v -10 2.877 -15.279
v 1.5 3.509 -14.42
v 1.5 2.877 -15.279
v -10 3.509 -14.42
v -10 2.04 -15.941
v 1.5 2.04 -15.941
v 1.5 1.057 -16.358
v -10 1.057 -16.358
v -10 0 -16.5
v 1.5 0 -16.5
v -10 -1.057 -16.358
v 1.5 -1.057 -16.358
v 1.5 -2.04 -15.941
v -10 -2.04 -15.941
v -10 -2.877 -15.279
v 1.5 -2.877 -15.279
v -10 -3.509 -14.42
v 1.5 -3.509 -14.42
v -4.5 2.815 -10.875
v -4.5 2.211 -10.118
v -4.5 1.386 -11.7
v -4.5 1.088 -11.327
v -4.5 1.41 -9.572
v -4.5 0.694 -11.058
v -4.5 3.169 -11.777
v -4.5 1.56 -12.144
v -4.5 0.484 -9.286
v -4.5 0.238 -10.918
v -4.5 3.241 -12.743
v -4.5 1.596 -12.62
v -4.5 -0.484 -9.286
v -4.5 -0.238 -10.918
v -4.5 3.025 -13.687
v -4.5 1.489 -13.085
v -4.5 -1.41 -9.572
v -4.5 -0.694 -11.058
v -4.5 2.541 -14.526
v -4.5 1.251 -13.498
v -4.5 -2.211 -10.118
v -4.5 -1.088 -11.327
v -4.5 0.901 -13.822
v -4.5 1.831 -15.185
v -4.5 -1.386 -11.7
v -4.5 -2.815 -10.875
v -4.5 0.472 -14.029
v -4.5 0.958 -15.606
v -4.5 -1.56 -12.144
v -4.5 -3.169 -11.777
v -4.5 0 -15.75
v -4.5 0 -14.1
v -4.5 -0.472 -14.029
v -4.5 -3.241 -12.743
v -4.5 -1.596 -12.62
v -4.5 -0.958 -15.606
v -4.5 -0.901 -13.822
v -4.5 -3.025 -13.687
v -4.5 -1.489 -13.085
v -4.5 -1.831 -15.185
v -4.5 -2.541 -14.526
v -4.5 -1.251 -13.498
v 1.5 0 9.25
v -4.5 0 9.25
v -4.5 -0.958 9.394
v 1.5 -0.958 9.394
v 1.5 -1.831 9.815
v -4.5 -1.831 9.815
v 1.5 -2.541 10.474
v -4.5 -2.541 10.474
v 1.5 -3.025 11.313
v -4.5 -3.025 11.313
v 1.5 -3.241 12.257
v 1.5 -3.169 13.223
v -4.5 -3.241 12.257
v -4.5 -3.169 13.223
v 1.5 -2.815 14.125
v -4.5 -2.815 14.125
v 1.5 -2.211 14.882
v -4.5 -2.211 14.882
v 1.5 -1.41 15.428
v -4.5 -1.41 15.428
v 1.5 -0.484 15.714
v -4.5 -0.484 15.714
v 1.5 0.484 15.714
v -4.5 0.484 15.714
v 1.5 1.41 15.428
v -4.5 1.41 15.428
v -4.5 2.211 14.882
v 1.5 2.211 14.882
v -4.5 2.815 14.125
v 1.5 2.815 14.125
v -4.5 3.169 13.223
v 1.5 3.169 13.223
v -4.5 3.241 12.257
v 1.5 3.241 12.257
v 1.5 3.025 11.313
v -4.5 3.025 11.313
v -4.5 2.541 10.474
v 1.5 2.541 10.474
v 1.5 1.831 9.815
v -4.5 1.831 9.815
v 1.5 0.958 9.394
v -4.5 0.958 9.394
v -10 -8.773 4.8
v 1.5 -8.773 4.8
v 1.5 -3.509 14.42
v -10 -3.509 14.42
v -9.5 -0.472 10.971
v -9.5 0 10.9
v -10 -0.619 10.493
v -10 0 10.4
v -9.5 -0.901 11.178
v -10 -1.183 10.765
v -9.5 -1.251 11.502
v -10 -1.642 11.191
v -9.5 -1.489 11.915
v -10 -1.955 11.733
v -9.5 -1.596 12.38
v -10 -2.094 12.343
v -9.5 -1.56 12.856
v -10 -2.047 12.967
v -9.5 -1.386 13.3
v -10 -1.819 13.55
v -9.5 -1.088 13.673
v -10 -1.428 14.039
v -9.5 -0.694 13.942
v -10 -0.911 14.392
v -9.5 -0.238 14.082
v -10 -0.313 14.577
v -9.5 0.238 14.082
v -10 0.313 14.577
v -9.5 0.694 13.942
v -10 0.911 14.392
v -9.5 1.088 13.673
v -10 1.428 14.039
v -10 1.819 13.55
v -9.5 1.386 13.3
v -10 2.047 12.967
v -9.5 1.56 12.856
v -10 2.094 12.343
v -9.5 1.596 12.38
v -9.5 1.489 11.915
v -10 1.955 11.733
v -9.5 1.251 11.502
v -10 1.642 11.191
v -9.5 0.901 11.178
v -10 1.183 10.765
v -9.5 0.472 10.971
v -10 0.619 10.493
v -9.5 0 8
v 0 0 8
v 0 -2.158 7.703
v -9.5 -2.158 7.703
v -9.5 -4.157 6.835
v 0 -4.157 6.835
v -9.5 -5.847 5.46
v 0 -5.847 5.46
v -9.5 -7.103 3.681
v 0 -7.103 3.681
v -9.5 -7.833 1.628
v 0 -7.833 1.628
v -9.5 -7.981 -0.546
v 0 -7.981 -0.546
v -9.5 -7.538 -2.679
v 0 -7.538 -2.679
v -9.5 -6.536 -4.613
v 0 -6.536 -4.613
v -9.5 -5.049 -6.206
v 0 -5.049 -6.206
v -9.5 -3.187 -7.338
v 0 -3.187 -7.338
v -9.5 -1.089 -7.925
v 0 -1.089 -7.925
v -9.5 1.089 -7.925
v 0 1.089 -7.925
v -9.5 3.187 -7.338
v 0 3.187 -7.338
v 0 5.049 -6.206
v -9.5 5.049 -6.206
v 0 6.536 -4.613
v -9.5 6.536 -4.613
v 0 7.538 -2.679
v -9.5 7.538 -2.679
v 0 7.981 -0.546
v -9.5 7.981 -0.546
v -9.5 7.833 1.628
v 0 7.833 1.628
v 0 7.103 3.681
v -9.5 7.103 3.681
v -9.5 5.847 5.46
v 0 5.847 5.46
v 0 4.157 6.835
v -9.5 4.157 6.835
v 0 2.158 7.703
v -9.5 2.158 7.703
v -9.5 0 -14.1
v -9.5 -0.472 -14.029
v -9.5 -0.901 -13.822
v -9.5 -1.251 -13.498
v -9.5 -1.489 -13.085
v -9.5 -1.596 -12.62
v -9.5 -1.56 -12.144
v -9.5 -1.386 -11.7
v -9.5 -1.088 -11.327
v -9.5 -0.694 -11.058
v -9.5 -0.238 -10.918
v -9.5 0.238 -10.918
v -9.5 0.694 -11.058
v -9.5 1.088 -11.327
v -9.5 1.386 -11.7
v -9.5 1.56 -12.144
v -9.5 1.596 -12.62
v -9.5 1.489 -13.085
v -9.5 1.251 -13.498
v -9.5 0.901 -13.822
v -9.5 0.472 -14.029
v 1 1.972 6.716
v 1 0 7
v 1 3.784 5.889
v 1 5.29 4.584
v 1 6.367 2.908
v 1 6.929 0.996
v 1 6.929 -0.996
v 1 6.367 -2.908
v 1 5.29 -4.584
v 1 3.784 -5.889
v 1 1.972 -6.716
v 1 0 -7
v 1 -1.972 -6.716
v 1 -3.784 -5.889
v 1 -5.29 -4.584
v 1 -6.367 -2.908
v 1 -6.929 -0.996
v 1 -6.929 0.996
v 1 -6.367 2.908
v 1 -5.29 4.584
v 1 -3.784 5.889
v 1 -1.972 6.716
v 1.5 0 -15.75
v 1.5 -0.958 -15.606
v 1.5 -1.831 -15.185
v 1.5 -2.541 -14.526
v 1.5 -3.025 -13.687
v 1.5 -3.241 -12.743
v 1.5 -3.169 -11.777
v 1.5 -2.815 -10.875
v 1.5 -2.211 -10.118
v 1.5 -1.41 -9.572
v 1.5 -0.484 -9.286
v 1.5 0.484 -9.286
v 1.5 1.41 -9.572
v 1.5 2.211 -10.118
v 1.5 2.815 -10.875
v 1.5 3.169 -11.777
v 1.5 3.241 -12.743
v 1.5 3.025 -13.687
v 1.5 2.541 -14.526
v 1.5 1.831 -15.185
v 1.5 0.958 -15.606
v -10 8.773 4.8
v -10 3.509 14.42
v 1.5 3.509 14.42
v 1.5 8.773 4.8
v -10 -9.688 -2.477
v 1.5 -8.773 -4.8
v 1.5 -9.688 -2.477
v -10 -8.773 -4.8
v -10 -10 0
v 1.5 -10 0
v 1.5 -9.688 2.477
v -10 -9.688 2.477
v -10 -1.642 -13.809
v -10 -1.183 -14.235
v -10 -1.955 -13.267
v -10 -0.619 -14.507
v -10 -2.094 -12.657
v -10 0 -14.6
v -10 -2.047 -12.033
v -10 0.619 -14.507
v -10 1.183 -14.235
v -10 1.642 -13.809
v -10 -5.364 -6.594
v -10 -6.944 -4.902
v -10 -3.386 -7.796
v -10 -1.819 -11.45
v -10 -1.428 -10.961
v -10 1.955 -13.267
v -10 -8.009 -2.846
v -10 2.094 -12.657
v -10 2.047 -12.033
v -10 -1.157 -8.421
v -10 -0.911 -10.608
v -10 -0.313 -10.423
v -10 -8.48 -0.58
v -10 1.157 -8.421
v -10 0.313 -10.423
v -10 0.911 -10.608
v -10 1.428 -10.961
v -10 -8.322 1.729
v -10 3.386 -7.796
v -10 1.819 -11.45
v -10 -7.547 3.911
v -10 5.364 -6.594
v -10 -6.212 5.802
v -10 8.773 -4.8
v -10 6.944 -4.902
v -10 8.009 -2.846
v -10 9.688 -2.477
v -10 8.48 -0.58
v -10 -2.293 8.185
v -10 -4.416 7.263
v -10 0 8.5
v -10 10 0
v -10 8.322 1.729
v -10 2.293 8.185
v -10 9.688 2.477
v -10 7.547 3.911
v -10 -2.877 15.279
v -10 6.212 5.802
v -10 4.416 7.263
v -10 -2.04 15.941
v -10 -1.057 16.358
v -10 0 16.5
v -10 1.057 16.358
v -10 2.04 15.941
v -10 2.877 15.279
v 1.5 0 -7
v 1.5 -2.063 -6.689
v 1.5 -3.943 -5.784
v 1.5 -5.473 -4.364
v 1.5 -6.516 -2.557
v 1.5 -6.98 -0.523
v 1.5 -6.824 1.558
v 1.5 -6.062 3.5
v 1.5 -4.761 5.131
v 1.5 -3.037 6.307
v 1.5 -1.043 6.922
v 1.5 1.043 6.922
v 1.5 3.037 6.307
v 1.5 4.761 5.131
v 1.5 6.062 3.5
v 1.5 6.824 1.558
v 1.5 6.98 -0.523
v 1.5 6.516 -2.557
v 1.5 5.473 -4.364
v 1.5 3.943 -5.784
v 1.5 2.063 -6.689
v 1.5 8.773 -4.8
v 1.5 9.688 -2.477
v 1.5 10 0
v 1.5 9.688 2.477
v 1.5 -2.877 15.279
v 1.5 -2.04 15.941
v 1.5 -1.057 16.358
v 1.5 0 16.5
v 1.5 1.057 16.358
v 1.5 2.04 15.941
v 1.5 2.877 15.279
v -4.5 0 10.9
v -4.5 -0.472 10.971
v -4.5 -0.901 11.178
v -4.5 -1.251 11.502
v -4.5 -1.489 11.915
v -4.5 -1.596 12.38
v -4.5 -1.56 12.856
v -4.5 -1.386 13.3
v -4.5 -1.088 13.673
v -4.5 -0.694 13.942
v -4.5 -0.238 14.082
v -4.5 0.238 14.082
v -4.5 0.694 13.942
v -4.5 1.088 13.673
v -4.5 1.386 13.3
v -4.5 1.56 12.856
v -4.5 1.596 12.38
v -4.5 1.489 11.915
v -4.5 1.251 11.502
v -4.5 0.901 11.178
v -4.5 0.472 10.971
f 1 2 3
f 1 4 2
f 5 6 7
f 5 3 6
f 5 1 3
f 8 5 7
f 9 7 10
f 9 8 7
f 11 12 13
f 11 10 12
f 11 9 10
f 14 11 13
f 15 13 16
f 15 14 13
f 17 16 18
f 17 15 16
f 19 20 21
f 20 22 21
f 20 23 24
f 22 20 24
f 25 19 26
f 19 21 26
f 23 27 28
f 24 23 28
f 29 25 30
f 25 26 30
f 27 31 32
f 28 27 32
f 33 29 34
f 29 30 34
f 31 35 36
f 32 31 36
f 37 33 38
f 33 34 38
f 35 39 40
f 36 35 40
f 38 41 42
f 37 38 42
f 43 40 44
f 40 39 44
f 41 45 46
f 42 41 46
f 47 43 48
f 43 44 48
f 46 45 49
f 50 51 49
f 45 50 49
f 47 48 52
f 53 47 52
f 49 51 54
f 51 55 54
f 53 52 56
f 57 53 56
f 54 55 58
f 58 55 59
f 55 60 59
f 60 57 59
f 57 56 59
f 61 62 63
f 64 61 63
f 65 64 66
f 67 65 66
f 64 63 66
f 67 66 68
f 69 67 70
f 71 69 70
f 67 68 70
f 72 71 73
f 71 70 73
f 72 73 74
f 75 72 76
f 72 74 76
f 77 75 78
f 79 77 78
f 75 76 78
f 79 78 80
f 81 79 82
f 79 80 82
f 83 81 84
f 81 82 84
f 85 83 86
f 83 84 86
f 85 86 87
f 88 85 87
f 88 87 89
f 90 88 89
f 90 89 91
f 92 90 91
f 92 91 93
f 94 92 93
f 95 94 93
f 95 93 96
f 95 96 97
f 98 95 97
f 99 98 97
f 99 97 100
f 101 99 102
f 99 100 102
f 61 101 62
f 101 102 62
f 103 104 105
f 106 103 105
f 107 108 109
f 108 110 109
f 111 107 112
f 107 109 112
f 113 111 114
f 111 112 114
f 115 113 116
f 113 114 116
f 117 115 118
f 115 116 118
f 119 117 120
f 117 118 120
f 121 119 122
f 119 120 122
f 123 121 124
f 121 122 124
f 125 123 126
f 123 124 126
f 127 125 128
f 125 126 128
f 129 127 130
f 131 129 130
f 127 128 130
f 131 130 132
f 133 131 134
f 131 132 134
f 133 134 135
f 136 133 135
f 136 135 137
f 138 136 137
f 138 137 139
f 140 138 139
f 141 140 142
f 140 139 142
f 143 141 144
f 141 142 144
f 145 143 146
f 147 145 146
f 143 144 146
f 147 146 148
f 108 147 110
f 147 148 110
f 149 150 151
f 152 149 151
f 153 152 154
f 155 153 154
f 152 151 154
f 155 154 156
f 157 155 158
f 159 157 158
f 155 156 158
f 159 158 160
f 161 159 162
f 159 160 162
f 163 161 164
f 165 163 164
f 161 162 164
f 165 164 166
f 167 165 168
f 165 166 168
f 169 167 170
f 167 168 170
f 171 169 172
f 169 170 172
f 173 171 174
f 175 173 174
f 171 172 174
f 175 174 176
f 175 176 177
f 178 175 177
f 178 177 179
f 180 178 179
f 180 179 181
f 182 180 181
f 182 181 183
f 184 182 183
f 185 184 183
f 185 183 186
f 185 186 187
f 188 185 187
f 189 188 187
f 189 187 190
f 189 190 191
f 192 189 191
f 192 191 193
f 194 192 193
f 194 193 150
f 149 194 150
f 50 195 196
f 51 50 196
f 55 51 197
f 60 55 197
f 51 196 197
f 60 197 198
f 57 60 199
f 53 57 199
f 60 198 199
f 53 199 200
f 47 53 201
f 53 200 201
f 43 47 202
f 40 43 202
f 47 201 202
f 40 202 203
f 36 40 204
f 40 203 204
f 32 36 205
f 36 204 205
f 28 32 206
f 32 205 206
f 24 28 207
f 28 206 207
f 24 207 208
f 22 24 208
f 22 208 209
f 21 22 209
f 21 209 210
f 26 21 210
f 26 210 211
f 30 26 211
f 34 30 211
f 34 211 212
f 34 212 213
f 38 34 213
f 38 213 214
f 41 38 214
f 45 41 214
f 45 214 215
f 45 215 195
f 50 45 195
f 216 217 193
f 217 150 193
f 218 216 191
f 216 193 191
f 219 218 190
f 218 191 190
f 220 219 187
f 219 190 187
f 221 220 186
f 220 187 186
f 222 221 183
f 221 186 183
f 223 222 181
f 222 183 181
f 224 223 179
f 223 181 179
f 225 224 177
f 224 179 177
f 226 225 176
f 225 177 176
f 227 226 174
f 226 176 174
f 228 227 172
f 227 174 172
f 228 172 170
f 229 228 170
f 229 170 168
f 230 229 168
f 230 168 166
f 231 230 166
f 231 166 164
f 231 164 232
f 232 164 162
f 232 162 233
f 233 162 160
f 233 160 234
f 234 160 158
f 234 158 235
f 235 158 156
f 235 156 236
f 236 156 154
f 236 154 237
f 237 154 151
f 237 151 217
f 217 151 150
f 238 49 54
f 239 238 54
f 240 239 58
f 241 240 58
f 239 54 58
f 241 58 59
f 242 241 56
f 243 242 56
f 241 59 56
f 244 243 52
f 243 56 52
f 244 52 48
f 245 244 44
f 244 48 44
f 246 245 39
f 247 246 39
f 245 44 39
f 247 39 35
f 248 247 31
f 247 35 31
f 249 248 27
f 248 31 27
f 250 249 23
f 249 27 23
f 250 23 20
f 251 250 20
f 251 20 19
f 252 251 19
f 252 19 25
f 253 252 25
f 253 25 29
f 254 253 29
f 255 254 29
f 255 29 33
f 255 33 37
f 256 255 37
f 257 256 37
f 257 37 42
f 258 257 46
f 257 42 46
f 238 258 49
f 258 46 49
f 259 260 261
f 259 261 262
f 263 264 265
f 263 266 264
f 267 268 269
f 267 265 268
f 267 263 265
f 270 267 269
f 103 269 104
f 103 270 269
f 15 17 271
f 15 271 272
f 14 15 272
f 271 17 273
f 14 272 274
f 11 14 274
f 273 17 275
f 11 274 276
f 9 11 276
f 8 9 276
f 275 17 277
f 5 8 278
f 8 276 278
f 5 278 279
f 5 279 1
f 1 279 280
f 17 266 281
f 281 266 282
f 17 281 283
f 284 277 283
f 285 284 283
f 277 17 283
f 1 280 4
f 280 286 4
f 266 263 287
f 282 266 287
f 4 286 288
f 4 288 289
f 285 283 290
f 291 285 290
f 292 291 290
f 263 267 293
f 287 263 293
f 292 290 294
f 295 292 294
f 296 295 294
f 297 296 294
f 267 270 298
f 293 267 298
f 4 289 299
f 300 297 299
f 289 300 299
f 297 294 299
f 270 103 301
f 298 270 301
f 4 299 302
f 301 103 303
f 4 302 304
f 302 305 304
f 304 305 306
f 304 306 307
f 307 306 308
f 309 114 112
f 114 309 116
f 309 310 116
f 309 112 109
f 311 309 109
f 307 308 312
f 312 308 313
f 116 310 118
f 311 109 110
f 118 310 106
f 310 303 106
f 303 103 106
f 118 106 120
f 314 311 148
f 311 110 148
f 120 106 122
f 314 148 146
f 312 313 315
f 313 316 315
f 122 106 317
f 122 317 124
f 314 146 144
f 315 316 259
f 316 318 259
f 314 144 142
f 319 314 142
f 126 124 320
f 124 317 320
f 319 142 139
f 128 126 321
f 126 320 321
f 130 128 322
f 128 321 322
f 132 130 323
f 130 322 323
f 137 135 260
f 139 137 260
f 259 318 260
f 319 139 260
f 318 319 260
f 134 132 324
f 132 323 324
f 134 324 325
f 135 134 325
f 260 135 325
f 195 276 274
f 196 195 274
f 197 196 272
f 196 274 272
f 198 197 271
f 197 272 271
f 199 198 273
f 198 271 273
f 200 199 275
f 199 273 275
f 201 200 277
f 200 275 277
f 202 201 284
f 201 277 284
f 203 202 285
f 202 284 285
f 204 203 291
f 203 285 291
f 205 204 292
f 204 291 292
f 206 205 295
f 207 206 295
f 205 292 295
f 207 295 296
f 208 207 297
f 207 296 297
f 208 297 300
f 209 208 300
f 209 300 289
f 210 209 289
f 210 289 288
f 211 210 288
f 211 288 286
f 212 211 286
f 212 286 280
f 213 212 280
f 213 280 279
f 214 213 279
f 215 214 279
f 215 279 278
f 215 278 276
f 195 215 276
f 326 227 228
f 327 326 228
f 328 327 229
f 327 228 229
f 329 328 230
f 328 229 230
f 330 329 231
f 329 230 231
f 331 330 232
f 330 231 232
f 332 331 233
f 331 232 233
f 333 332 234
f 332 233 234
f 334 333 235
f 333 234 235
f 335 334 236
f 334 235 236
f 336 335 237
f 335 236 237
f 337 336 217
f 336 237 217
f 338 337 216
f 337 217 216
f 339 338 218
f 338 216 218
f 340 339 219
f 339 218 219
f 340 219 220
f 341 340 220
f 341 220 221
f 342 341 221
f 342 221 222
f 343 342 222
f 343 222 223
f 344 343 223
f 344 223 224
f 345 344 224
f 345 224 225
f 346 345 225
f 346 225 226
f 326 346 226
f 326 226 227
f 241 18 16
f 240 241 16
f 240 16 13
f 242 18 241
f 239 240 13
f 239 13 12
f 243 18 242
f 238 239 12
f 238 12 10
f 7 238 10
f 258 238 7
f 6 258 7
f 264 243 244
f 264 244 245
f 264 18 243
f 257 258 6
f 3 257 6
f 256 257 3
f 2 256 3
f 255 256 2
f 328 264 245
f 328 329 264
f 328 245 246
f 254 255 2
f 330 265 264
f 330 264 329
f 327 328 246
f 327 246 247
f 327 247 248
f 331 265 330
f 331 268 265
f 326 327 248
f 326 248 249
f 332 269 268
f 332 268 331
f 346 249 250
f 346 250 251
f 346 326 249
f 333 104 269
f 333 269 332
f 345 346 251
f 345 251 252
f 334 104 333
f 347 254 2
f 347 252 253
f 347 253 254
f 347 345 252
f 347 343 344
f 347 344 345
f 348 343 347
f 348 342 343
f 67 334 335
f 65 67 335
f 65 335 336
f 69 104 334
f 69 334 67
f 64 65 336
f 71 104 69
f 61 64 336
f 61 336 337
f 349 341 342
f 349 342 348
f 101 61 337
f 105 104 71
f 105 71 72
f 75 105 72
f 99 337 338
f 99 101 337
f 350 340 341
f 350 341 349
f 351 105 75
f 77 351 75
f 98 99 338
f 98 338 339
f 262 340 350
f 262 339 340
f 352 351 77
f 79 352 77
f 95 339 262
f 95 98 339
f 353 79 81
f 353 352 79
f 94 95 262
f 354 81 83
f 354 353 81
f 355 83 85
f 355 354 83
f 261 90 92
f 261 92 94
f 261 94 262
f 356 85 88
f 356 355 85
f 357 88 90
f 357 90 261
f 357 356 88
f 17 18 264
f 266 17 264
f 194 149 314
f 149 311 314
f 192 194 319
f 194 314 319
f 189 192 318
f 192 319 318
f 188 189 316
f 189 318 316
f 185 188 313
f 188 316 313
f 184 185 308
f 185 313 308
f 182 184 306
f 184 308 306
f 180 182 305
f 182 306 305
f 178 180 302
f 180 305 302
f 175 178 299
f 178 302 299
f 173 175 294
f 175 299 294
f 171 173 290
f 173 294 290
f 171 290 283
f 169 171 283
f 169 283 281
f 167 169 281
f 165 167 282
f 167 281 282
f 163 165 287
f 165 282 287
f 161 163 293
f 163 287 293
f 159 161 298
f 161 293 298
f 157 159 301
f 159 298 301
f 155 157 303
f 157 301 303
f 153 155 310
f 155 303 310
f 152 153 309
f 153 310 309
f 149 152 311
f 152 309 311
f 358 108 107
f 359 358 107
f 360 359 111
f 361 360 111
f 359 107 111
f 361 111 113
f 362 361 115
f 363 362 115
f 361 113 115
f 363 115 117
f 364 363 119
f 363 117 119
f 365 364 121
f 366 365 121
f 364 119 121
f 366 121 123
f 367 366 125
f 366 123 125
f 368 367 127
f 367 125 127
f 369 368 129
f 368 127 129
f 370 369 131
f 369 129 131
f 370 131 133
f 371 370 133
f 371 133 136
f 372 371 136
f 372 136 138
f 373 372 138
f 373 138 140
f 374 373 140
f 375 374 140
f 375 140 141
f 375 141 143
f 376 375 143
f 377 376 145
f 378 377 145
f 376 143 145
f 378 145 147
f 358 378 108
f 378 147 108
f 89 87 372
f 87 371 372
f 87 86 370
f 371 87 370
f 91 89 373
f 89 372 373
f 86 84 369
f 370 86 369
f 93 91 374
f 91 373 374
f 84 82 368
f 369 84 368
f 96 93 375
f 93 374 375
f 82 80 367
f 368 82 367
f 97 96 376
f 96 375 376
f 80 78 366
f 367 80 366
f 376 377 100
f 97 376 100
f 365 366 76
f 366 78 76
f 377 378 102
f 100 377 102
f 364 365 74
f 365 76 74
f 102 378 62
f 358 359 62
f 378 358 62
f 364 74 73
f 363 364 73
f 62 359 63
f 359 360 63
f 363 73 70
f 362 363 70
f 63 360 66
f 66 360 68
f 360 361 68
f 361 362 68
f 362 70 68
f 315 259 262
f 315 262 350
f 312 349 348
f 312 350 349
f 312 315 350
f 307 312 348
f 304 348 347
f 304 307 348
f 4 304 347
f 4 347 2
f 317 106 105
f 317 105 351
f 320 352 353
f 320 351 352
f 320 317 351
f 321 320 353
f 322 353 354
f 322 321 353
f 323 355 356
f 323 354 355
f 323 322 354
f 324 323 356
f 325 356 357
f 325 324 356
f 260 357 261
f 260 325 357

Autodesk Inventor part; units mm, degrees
ref_plane "XZ Plane" through (0, 0, 0) normal (0, 1, 0) x (-1, 0, 0)
ref_plane "XY Plane" through (0, 0, 0) normal (0, 0, 1) x (1, 0, 0)
ref_plane "Work Plane1" through (-10, 0, 0) normal (1, 0, 0) x (0, 1, 0)
sketch "Sketch1" plane through (-10, 0, 0) normal (1, 0, 0) x (0, 1, 0)
  line L0 (3.5091, 14.42) -> (8.7727, 4.8)
  arc A0 (-8.7727, 4.8) -> (-8.7727, -4.8) centre (0, 0) ccw
  line L1 (8.7727, -4.8) -> (3.5091, -14.42)
  arc A1 (3.5091, 14.42) -> (-3.5091, 14.42) centre (0, 12.5) ccw
  line L2 (-3.5091, -14.42) -> (-8.7727, -4.8)
  arc A2 (8.7727, -4.8) -> (8.7727, 4.8) centre (0, 0) ccw
  line L3 (-8.7727, 4.8) -> (-3.5091, 14.42)
  arc A3 (-3.5091, -14.42) -> (3.5091, -14.42) centre (0, -12.5) ccw
extrude "Extrusion1" add sketch "Sketch1" along normal blind 11.5
hole "Hole4" at (1.5, 0, 0) direction (-1, 0, 0) diameter 14 depth 11.5
hole "Hole3" at (1.5, 0, -12.5) direction (-1, 0, 0) diameter 3.2 depth 11.5 counterbore diameter 6.5 counterbore depth 6
sketch "Sketch3" plane through (1.5, 0, 0) normal (1, 0, 0) x (0, 0, -1)
  point P0 (12.5, 0)
hole "Hole2" at (1.5, 0, 12.5) direction (-1, 0, 0) diameter 3.2 depth 11.5 counterbore diameter 6.5 counterbore depth 6
sketch "Sketch2" plane through (1.5, 0, 0) normal (1, 0, 0) x (0, 0, -1)
  point P0 (0, 0)
hole "Hole1" at (-10, 0, 0) direction (1, 0, 0) diameter 16 depth 10 tip angle 90
chamfer "Chamfer3" distance 0.5 angle 45 1 edges at (-10, 0, -10.9)
chamfer "Chamfer2" distance 0.5 angle 45 1 edges at (-10, 0, 14.1)
chamfer "Chamfer1" distance 0.5 angle 45 1 edges at (-10, 0, -8)
sketch "Sketch4" plane through (1.5, 0, 0) normal (1, 0, 0) x (0, 0, -1)
  point P0 (-12.5, 0)
sketch "Sketch5" plane through (-10, 0, 0) normal (1, 0, 0) x (0, 1, 0)
  point P0 (0, 0)
properties part number "XY Drive Bearing Holder"
